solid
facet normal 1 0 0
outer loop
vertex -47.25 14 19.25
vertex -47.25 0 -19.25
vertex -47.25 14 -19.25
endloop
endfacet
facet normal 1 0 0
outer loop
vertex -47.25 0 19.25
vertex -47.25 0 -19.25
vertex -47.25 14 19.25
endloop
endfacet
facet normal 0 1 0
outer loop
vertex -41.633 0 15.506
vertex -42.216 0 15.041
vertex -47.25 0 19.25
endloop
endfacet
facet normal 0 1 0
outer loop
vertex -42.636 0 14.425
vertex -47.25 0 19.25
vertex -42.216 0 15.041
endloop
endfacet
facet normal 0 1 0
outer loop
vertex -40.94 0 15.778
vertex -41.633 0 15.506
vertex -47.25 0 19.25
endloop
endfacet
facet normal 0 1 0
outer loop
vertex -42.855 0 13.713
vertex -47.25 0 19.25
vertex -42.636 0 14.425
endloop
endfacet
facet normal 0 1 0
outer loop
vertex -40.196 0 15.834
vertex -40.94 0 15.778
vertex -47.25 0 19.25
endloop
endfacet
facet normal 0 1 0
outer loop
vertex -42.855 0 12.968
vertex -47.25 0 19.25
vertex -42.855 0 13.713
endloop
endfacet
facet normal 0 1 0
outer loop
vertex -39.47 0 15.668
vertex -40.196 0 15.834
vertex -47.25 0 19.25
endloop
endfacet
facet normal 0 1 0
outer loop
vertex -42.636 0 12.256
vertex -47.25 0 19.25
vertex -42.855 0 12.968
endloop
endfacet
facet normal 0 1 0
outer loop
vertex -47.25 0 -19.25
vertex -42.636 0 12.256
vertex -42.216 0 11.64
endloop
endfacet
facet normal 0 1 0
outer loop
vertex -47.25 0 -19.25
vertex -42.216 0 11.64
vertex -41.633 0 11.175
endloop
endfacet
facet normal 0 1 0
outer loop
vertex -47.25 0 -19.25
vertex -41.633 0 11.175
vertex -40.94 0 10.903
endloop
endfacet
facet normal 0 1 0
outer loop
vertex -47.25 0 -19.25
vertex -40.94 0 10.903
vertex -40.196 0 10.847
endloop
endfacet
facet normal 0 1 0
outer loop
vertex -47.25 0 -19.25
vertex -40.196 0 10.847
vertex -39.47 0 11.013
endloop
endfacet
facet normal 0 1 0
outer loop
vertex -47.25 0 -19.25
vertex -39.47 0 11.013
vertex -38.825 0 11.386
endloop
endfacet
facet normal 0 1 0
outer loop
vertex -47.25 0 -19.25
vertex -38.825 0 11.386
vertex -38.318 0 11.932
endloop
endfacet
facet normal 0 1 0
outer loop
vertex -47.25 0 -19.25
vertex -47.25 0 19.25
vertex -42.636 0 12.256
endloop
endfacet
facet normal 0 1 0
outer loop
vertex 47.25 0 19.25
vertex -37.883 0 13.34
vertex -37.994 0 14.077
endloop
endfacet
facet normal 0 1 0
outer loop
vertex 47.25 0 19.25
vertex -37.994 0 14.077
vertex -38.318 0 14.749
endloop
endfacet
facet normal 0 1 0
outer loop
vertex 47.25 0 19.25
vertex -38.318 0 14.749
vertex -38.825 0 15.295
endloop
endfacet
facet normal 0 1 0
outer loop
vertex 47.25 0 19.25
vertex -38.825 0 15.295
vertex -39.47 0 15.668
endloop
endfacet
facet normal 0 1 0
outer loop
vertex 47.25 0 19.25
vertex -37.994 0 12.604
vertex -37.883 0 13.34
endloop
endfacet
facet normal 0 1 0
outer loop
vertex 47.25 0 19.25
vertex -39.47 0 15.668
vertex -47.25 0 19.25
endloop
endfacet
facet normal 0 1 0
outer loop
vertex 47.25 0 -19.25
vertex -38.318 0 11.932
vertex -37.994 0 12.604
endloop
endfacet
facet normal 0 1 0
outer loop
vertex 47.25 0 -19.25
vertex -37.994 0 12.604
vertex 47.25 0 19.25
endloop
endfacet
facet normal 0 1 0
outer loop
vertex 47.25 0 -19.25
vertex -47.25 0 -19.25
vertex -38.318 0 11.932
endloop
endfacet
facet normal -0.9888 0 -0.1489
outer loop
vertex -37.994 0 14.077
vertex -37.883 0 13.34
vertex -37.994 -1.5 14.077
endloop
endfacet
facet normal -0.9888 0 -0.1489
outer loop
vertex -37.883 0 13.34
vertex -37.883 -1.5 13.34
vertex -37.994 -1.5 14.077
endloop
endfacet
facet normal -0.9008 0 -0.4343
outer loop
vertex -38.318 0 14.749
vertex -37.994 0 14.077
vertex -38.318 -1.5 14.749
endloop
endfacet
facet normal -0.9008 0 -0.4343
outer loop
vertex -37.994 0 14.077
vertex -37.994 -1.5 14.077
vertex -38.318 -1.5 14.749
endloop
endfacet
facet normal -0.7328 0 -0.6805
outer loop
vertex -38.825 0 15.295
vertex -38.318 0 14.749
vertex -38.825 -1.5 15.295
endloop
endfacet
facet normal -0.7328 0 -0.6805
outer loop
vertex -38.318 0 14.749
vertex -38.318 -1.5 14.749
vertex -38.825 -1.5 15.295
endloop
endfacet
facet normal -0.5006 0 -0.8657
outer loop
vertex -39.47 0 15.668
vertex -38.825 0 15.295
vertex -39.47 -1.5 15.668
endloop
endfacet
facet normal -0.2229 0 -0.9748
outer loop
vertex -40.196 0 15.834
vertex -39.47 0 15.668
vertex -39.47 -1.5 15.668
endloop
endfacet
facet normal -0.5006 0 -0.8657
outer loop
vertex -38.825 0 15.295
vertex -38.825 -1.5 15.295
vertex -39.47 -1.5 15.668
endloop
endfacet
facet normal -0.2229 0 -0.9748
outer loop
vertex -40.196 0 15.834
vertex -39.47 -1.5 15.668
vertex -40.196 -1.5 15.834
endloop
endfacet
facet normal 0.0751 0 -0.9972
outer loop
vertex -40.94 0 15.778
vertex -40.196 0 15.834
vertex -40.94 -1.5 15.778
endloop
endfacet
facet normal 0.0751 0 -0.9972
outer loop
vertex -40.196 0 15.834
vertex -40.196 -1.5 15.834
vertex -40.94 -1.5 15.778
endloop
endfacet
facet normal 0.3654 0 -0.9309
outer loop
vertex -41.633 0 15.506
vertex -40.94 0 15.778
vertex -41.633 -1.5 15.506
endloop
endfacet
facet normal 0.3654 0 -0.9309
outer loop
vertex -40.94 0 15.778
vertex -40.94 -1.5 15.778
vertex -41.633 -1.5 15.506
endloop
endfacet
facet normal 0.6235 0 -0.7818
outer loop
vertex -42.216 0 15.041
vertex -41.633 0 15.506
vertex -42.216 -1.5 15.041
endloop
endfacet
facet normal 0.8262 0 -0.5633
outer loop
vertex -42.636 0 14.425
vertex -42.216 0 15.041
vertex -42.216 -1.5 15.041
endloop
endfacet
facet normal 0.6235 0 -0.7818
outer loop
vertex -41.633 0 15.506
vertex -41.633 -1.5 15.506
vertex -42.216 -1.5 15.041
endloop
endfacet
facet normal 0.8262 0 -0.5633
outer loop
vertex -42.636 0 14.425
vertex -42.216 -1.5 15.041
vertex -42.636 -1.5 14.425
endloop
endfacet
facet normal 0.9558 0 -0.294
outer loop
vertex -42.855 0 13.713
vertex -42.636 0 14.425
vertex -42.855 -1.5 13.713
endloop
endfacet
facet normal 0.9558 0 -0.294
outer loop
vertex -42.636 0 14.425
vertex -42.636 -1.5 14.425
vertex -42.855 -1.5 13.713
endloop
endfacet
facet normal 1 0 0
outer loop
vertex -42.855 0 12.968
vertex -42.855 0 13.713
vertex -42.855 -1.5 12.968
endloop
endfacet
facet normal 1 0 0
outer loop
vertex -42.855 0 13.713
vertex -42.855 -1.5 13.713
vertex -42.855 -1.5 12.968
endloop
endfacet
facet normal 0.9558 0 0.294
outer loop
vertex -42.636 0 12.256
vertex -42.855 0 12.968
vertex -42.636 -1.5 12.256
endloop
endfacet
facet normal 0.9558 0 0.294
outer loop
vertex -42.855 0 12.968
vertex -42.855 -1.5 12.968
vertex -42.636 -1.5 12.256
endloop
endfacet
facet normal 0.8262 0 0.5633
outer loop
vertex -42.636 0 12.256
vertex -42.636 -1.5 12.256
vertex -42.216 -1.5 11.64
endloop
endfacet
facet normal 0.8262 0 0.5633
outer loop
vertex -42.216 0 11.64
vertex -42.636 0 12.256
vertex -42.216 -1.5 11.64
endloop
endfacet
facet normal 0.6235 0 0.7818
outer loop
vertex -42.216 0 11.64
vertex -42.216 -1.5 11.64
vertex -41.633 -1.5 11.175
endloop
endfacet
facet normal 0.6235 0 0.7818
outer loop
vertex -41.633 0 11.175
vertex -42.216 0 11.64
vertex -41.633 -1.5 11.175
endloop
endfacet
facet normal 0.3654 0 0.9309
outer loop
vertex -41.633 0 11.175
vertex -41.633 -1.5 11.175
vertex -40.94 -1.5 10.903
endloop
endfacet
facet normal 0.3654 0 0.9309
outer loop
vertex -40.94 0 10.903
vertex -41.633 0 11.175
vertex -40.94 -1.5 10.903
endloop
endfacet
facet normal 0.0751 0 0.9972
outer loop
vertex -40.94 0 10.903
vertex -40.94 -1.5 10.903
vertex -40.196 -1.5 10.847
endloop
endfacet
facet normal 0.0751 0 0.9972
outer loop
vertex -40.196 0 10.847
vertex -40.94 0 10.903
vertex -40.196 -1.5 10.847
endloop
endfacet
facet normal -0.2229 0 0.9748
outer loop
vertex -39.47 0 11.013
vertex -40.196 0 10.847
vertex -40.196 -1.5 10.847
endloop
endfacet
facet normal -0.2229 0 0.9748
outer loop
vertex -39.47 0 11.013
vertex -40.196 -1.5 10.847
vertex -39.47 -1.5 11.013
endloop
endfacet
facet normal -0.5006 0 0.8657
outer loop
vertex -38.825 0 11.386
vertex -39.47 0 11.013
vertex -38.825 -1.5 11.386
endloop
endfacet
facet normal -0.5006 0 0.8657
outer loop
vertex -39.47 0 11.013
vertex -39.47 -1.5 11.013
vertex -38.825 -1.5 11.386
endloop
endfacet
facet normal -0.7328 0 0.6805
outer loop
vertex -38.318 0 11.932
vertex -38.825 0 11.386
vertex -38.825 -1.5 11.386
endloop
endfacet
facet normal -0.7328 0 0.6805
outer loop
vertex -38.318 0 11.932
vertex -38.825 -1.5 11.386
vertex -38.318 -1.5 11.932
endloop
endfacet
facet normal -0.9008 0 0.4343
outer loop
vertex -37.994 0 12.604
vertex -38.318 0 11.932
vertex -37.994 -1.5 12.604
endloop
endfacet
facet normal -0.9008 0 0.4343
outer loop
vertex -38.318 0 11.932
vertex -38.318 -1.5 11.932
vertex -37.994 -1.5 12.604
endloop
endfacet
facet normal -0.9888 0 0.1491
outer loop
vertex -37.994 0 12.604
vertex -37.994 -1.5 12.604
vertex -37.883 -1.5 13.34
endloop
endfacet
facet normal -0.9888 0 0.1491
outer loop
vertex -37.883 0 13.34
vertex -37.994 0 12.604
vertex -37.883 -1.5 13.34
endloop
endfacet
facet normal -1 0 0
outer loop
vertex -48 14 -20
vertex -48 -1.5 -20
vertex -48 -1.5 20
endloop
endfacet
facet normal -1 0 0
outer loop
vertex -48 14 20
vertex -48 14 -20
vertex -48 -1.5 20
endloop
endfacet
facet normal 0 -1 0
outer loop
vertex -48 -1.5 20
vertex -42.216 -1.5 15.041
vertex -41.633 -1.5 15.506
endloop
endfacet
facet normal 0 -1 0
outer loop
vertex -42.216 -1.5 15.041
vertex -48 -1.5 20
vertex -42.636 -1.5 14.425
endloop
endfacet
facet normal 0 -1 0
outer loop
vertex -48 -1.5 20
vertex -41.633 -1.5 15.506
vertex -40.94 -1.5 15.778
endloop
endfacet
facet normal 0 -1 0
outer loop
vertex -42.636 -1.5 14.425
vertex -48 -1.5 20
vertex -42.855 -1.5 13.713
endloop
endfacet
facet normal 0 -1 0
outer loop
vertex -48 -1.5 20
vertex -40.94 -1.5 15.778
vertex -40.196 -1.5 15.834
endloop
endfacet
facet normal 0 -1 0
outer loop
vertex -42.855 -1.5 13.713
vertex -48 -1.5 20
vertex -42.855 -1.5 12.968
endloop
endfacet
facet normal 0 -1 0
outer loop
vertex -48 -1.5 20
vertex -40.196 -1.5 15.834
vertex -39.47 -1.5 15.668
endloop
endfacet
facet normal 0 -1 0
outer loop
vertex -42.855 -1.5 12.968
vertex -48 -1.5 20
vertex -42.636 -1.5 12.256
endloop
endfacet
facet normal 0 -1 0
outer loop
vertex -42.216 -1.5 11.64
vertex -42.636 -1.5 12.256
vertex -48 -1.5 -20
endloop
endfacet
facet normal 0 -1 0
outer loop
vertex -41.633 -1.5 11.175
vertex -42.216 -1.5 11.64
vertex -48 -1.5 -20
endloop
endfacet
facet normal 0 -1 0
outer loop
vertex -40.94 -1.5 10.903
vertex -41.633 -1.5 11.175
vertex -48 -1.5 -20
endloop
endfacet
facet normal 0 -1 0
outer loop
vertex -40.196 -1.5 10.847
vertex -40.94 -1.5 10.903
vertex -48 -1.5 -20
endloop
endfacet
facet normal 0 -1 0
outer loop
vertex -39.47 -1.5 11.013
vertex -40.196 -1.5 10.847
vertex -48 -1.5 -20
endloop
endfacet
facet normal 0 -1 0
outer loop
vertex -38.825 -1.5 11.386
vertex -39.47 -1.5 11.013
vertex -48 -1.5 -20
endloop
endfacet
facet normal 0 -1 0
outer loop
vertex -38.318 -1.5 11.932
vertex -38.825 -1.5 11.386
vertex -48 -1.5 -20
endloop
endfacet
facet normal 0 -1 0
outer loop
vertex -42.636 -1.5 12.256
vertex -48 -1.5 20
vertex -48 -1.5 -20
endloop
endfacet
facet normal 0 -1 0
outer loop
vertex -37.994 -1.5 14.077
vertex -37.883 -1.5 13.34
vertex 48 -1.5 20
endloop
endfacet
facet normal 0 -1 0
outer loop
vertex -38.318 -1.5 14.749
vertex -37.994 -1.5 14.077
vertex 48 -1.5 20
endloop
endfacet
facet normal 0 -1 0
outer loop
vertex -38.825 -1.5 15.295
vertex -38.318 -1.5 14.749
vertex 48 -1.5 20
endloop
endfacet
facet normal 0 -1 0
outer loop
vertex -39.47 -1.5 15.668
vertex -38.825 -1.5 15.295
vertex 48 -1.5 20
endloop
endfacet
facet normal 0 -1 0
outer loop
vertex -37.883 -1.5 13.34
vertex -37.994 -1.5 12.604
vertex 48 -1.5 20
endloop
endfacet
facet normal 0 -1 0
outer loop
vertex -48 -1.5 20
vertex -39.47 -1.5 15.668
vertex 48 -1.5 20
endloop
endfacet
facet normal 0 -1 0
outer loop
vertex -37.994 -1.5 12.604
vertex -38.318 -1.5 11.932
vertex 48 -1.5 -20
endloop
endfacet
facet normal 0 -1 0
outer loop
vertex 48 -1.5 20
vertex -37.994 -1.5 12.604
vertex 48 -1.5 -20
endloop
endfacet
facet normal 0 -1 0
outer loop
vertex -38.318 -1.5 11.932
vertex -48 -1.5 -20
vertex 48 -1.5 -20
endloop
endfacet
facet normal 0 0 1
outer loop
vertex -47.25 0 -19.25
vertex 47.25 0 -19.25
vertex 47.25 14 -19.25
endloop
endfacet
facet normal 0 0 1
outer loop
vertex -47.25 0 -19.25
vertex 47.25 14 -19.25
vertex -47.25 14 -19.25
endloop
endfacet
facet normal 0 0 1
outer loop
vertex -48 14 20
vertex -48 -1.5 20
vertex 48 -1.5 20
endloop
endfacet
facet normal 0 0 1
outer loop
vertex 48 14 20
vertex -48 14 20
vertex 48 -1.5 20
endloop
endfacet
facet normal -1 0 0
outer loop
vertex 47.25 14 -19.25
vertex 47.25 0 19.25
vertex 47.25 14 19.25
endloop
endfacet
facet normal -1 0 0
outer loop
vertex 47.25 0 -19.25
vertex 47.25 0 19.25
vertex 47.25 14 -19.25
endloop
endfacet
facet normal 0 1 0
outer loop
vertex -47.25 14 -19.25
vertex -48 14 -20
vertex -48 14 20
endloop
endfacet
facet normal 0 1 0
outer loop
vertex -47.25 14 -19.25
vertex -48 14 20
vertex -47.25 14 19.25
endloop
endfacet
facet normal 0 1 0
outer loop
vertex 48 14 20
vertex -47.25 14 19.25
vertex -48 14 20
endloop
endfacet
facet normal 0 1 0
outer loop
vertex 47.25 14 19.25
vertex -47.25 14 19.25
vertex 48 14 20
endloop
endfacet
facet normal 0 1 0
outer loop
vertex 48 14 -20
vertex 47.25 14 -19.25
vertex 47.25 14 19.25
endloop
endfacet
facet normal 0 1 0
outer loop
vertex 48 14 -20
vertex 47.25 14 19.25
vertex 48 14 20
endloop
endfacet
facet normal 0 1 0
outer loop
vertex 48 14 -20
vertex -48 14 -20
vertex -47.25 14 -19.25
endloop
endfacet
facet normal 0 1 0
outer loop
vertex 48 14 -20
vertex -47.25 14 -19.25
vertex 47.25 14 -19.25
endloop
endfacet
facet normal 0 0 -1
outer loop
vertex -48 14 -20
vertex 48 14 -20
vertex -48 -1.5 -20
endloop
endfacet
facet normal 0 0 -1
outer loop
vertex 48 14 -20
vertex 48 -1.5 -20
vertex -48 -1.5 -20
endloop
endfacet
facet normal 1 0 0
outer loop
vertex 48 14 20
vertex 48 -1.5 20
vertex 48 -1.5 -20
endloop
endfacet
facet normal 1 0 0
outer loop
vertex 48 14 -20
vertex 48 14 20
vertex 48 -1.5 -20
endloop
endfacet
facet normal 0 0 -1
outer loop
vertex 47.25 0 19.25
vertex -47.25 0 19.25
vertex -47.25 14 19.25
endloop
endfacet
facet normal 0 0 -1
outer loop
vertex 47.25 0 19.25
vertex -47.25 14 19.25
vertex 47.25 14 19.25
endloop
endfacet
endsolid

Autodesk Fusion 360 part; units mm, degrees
sketch "Sketch1" plane through (0, 0, 0) normal (0, 1, 0) x (1, 0, 0)
  line L0 (48, 20) -> (-48, 20)
  line L1 (-48, 20) -> (-48, -20)
  line L2 (-48, -20) -> (48, -20)
  line L3 (48, -20) -> (48, 20)
  line L4 (48, 20) -> (-48, -20) construction
  line L5 (-48, 20) -> (48, -20) construction
  line L6 (47.25, 19.25) -> (-47.25, 19.25)
  line L7 (-47.25, 19.25) -> (-47.25, -19.25)
  line L8 (-47.25, -19.25) -> (47.25, -19.25)
  line L9 (47.25, -19.25) -> (47.25, 19.25)
  line L10 (47.25, 19.25) -> (-47.25, -19.25) construction
  line L11 (-47.25, 19.25) -> (47.25, -19.25) construction
  dimension "d1" = 96
  dimension "d2" = 40
  dimension "d3" = 94.5
  dimension "d4" = 38.5
extrude "Extrude1" add sketch "Sketch1" along normal blind 14
sketch "Sketch2" plane through (0, 0, 0) normal (0, 1, 0) x (1, 0, 0)
  line L0 (-48, -20) -> (48, -20)
  line L1 (48, -20) -> (48, 20)
  line L2 (48, 20) -> (-48, 20)
  line L3 (-48, 20) -> (-48, -20)
extrude "Extrude2" add sketch "Sketch2" against normal blind 1.5
sketch "Sketch3" plane through (0, -1.5, 0) normal (0, -1, 0) x (1, 0, 0)
  line L0 (-48, 20) -> (-48, -20)
  line L1 (-48, -20) -> (48, -20)
  line L2 (48, -20) -> (48, 20)
  line L3 (48, 20) -> (-48, 20)
  circle A0 centre (-40.3833, 13.3405) radius 2.5
  dimension "d10" = 5
extrude "Extrude3" cut sketch "Sketch3" against normal blind 2.918 contours A0
